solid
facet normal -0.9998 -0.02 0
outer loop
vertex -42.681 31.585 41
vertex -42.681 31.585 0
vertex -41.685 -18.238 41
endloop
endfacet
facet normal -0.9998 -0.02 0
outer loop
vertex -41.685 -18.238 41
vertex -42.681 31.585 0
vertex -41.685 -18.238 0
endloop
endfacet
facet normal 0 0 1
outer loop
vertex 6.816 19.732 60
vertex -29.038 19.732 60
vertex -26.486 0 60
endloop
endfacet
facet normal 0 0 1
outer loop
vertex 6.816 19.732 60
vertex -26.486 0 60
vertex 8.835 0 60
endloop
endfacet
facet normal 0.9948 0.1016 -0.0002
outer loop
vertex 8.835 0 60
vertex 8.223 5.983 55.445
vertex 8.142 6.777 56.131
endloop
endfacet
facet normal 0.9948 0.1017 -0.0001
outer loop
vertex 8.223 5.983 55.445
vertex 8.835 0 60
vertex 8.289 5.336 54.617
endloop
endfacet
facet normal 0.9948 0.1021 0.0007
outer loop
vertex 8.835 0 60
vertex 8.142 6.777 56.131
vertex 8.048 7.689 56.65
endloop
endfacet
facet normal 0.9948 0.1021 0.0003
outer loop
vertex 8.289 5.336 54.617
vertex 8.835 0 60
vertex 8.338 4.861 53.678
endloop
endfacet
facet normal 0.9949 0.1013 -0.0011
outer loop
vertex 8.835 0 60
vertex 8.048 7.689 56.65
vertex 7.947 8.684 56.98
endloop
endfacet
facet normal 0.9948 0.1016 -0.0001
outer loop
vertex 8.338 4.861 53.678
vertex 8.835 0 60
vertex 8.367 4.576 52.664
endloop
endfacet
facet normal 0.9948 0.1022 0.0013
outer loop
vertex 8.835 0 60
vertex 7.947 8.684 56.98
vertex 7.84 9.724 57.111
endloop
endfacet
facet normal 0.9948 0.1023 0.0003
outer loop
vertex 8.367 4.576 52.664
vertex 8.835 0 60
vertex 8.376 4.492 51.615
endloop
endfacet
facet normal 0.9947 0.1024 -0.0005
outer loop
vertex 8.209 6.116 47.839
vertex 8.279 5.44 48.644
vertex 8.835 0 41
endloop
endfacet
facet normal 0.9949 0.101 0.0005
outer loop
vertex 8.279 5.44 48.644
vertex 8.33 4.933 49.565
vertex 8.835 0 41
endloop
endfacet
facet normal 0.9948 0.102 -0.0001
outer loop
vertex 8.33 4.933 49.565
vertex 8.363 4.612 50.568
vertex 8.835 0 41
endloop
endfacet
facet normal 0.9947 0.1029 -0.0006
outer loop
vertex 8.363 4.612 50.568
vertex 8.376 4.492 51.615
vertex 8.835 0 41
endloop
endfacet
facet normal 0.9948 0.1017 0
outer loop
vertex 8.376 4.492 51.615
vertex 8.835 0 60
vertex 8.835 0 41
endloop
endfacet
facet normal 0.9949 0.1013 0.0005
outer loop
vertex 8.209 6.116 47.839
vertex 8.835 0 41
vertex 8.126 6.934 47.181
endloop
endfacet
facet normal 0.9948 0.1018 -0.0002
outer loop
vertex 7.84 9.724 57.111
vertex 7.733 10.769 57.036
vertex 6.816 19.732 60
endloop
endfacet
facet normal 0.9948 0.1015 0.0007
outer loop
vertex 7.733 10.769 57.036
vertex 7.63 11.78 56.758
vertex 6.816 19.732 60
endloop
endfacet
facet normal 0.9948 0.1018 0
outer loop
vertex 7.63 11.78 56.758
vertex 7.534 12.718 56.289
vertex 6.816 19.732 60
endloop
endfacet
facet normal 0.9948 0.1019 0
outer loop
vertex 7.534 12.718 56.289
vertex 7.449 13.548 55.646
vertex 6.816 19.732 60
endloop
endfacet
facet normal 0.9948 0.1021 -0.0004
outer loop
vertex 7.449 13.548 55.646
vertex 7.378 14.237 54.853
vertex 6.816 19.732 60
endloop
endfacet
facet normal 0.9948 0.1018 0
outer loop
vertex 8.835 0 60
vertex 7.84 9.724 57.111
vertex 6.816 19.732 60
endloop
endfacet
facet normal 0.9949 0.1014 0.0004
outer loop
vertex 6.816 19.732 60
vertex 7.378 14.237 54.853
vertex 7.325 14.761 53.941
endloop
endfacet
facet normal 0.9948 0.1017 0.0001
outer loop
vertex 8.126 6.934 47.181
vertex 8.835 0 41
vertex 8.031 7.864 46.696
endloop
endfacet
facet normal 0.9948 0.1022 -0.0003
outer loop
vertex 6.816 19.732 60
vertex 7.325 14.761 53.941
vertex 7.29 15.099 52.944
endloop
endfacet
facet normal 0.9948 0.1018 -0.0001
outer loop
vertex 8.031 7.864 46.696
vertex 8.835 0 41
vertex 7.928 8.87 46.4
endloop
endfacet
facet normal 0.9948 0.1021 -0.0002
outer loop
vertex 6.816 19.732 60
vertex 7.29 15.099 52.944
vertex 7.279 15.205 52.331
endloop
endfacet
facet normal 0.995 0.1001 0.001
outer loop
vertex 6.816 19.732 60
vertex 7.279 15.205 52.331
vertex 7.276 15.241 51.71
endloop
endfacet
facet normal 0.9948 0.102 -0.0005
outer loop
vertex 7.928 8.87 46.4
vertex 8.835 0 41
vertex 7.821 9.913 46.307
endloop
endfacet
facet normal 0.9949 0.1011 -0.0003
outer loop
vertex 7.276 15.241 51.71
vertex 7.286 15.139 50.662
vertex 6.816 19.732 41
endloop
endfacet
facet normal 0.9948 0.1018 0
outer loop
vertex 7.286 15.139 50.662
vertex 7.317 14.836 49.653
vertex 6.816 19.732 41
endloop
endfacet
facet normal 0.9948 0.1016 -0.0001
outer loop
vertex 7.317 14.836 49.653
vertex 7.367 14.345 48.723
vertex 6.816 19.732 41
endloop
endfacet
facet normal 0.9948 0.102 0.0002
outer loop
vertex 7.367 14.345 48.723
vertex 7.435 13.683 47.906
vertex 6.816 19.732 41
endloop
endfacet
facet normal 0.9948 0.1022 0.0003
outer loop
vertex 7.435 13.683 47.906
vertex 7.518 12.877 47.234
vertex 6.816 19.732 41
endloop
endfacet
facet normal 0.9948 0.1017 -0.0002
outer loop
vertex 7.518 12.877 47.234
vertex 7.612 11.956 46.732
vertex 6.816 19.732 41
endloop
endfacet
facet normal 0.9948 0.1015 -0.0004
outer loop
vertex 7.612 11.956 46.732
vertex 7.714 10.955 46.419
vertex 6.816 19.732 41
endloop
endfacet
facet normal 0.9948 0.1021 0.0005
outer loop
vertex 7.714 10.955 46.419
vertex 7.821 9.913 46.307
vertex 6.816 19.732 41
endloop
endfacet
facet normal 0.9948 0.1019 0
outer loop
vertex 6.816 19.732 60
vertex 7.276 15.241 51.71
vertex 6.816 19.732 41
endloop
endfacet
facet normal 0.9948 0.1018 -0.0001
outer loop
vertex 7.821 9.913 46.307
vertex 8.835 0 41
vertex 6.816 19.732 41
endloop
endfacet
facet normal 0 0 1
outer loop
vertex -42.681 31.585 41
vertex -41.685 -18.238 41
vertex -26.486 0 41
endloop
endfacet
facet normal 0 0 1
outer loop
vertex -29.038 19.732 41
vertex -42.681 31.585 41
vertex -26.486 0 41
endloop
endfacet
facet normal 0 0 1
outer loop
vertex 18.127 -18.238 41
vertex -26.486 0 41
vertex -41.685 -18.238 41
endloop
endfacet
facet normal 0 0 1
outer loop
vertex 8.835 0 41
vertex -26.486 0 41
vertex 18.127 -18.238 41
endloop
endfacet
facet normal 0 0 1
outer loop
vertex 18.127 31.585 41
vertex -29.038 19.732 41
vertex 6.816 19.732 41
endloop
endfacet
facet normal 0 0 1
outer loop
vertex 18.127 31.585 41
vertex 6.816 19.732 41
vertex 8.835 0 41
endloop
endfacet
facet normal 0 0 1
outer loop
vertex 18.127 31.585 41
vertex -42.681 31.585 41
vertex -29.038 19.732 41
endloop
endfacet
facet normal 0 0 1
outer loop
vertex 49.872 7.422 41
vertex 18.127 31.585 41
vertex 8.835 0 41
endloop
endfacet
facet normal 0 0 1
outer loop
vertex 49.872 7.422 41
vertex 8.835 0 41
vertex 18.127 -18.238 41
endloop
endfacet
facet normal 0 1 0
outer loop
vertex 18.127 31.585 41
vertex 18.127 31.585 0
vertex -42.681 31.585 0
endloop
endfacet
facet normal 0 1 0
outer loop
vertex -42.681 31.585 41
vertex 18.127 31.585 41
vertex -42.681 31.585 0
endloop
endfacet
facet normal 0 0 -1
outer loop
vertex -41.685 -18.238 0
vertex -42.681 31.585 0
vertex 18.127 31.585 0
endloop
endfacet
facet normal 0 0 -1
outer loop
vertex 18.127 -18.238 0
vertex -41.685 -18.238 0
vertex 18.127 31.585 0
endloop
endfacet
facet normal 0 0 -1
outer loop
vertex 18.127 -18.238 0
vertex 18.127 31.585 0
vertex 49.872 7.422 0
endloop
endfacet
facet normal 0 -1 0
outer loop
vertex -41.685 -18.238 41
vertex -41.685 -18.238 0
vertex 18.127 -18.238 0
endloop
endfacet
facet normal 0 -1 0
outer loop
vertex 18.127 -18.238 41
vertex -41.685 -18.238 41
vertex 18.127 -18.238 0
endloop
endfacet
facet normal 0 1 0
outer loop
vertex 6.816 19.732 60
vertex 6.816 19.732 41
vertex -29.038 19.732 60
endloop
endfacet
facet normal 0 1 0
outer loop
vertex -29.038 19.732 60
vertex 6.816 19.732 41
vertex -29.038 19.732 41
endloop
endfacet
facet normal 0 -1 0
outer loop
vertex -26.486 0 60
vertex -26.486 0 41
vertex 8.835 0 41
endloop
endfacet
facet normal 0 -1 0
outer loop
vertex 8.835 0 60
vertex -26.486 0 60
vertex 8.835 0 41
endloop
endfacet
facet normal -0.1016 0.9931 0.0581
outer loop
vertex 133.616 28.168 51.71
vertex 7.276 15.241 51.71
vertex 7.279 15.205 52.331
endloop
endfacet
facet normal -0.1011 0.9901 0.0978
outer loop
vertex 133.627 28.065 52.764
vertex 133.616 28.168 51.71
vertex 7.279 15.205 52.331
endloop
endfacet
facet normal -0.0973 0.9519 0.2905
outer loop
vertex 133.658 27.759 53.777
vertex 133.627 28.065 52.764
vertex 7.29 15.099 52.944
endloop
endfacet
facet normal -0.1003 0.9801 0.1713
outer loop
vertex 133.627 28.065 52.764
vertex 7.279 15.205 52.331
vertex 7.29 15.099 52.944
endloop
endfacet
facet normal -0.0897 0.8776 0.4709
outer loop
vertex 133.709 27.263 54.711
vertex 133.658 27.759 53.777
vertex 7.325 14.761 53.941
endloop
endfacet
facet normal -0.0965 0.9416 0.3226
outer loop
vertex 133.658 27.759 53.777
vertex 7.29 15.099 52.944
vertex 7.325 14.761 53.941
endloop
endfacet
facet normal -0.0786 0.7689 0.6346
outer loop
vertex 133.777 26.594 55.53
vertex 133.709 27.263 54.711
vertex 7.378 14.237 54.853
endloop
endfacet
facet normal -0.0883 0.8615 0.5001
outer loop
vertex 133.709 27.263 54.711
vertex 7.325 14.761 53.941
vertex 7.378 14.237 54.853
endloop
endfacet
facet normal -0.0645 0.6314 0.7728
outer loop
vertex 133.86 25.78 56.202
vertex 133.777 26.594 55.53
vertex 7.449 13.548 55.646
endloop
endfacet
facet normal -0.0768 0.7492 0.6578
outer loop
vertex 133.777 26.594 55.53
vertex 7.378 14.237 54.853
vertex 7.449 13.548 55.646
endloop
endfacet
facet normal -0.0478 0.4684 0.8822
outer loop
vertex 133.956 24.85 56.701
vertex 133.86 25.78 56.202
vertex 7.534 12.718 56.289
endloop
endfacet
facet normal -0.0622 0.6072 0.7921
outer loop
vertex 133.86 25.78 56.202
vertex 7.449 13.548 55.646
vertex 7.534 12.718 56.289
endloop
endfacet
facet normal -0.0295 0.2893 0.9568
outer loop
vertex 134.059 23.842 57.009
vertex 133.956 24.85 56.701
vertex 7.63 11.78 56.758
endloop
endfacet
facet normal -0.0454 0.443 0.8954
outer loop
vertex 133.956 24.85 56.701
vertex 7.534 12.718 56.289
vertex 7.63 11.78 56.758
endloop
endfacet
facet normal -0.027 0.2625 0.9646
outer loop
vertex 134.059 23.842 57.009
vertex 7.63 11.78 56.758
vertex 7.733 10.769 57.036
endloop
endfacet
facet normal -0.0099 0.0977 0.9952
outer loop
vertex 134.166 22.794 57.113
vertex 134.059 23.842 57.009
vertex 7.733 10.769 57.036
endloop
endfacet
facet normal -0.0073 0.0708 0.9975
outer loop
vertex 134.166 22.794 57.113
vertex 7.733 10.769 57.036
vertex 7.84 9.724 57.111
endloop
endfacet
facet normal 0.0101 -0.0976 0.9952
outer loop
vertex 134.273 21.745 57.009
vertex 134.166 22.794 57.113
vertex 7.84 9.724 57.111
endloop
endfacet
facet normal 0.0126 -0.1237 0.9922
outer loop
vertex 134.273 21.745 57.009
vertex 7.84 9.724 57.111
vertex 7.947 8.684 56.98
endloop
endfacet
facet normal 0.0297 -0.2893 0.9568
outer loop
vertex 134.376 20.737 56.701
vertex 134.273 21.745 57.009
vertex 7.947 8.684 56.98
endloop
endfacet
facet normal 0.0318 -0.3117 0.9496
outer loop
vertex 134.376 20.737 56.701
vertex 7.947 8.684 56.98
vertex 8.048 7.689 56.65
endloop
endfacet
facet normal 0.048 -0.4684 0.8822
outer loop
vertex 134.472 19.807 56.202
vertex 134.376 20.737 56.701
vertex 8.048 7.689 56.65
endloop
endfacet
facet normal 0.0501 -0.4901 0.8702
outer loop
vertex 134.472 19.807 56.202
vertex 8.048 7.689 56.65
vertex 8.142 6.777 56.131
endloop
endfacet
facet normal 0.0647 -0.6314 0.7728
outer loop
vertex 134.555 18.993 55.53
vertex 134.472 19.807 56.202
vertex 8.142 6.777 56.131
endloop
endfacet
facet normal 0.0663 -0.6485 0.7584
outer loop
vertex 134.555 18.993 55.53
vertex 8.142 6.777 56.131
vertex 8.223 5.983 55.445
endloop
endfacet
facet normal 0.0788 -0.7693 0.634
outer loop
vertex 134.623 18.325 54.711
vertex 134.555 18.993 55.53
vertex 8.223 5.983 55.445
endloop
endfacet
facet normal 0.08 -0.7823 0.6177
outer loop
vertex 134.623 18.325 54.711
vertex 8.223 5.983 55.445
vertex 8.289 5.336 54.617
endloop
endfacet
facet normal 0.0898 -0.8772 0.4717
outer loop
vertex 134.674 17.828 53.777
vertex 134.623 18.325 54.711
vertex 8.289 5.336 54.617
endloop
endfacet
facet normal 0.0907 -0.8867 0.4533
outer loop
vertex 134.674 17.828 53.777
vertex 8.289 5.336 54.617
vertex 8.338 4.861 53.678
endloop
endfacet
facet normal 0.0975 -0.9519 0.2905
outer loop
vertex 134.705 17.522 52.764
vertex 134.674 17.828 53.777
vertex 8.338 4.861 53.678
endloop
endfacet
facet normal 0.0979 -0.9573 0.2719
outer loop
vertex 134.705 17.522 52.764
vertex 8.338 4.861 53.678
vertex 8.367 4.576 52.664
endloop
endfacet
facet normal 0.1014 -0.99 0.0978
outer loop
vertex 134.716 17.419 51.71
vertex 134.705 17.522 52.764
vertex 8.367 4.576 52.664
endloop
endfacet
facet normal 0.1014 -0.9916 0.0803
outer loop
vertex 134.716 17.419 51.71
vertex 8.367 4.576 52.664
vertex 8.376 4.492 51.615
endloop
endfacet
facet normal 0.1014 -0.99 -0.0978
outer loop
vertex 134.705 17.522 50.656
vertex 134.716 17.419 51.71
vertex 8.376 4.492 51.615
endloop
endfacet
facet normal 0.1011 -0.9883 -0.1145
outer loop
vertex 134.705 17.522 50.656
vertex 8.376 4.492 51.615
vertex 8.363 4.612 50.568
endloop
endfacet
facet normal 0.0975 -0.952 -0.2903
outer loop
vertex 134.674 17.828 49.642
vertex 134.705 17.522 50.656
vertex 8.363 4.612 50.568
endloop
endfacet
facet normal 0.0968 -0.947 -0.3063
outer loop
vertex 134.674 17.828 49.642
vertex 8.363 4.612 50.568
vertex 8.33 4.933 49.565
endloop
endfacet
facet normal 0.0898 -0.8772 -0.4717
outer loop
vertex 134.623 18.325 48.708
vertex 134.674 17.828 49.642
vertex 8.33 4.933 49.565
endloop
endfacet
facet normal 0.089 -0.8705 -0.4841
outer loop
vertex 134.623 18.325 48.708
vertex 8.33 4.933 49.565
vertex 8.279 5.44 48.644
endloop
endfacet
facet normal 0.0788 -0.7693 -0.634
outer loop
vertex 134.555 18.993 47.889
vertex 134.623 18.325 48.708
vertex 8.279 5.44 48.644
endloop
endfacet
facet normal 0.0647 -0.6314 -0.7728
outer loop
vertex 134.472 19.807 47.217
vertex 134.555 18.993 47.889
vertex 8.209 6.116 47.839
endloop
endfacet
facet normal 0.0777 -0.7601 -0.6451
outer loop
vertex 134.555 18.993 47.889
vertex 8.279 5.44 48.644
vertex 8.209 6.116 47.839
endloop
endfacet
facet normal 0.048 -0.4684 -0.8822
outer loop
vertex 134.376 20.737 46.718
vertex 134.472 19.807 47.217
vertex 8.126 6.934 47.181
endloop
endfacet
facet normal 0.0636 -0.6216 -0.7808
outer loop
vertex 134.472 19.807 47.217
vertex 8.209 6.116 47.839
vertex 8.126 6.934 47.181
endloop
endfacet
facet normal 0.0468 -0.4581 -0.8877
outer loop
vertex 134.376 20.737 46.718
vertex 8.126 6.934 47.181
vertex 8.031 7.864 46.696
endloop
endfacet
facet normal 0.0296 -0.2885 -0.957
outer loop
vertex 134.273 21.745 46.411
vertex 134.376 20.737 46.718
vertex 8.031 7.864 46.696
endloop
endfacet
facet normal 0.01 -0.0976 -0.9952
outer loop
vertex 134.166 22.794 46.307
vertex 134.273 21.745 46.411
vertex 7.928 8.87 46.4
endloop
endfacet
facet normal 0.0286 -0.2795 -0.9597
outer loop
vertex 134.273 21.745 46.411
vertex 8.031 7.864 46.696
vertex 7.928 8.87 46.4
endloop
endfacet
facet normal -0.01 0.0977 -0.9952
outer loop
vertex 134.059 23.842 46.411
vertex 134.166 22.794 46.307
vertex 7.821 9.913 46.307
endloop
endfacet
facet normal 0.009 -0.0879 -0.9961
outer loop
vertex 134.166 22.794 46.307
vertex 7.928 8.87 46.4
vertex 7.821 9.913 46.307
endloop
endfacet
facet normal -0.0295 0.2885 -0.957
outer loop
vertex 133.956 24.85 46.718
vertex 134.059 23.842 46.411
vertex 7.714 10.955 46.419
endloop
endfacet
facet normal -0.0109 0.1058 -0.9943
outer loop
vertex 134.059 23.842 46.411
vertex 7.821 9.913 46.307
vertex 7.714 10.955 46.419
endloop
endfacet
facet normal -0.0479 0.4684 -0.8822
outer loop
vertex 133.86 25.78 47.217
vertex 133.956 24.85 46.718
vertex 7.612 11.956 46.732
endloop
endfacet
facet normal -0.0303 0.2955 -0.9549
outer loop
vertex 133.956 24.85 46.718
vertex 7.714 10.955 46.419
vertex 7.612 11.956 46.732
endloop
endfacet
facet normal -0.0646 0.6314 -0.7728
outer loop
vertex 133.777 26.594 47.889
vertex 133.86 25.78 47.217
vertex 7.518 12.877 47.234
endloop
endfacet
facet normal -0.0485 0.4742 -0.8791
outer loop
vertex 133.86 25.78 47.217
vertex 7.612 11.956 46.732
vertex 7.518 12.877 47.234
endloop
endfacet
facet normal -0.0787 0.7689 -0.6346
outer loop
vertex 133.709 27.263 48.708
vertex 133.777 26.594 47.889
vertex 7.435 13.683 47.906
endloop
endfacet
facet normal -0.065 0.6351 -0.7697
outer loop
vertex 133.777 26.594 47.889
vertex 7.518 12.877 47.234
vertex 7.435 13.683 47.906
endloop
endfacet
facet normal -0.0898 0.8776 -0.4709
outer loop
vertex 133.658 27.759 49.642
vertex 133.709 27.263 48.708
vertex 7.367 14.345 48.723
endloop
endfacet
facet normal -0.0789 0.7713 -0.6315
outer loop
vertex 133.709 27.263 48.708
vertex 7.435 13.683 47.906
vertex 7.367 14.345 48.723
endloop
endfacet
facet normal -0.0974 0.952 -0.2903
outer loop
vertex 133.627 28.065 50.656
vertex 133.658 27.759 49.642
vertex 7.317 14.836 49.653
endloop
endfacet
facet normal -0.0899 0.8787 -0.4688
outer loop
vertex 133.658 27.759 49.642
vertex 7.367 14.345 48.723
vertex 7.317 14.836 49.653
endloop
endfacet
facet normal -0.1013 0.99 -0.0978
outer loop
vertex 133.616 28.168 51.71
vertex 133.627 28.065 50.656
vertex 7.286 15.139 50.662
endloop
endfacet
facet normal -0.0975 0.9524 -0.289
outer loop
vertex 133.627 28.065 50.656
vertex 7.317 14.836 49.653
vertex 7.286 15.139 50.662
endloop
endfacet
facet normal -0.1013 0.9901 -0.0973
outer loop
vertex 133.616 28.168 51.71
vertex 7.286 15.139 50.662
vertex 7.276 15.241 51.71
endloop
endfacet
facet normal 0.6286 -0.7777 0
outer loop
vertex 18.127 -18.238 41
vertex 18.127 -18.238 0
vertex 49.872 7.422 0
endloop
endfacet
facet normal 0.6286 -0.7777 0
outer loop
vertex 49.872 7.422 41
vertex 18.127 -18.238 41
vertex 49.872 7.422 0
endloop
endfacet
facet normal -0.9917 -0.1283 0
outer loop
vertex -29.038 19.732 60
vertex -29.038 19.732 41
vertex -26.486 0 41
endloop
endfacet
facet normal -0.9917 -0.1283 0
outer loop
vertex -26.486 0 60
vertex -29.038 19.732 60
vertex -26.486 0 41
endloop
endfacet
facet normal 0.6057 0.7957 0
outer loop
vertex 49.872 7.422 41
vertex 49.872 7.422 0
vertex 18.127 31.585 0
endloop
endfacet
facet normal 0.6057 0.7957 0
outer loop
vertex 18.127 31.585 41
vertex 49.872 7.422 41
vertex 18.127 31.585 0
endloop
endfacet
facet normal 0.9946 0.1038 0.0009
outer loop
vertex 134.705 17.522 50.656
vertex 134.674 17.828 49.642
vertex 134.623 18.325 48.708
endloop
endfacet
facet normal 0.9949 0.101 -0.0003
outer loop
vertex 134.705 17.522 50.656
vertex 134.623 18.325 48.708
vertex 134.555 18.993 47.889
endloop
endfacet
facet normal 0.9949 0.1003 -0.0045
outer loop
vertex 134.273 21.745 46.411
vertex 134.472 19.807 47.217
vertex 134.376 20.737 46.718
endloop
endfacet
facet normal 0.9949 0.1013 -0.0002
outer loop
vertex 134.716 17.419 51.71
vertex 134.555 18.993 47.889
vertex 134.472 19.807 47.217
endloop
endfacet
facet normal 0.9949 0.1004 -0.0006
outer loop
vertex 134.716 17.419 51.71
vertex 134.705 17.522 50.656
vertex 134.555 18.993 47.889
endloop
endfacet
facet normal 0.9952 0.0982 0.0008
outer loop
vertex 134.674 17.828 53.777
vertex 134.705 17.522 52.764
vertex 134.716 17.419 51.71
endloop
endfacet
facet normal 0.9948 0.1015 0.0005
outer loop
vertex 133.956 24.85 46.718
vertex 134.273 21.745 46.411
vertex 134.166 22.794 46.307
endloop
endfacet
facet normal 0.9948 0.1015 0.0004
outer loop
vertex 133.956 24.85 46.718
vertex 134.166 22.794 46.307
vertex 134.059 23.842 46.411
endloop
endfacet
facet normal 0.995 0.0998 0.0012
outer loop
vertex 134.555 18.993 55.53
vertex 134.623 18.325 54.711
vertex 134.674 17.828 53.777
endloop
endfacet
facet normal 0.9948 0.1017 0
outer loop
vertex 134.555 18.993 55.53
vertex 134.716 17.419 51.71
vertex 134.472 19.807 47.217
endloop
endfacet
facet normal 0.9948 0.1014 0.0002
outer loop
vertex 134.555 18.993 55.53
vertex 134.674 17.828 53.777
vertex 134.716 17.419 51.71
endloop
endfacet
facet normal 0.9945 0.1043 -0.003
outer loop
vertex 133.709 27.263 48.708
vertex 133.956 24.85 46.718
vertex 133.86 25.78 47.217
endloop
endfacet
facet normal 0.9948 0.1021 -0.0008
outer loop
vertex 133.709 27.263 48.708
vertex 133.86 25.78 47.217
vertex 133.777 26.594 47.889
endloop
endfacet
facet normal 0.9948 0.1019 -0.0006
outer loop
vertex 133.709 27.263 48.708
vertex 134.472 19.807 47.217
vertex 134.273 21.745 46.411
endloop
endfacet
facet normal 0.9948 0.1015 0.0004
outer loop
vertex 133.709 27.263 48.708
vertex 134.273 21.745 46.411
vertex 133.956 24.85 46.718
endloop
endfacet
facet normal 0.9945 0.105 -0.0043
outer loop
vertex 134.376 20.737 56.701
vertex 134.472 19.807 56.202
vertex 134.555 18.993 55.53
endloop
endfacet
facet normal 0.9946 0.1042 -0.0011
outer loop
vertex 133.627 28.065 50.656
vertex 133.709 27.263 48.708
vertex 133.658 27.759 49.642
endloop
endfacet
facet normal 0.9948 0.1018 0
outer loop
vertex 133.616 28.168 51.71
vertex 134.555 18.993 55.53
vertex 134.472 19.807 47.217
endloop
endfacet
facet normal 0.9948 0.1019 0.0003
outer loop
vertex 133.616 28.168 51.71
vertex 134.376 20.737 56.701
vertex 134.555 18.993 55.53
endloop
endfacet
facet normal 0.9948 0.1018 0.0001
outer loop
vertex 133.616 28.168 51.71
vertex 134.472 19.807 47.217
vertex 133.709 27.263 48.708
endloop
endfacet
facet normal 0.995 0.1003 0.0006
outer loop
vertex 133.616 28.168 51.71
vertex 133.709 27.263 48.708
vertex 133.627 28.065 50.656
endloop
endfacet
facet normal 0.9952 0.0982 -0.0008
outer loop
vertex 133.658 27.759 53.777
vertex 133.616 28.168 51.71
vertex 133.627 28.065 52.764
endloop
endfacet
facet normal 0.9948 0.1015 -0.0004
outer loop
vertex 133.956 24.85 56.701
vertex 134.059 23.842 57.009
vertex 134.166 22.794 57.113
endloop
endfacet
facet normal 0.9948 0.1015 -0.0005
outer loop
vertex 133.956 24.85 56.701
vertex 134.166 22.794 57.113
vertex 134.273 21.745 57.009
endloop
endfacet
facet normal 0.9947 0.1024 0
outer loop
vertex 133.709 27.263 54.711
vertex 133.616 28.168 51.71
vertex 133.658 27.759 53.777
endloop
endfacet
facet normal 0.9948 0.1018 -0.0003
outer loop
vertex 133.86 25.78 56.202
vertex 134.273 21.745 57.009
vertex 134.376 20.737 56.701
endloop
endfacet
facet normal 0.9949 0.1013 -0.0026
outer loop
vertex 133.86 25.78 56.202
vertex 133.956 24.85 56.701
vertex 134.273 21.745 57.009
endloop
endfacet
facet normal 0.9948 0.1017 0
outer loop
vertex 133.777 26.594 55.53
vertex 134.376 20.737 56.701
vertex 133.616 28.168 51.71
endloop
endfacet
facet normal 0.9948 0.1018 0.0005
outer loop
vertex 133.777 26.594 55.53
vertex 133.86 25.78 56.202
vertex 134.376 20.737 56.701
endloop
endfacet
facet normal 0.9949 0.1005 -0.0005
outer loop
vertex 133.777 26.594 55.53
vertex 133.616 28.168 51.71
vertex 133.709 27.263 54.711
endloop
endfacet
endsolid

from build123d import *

# Parameters (mm, degrees)
F1_DEPTH = 41
F3_DEPTH = 19
F4_R     = 5.402873
F5_DEPTH = 127


with BuildPart() as f1:
    # F0 (on Top) → F1 (new body)
    with BuildSketch(Plane.XY):
        Polygon((-42.681199, 31.584967), (-41.684866, -18.23815), (18.126922, -18.23815), (49.872324, 7.42222), (18.126922, 31.584967), align=None)
    extrude(amount=F1_DEPTH)

    # F2 (on face) → F3 (join)
    with BuildSketch(Plane.XY.offset(41)):
        Polygon((6.816162, 19.731937), (-29.038044, 19.731937), (-26.485959, 0), (8.835195, 0), align=None)
    extrude(amount=F3_DEPTH)

    # F4 (on face) → F5 (join)
    with BuildSketch(Plane(origin=(8.743648, 0.894677, 0), x_dir=(-0.101792, 0.994806, 0), z_dir=(0.994806, 0.101792, 0))):
        with Locations((9.018134, 51.709723)):
            Circle(F4_R)
    extrude(amount=F5_DEPTH)


solid = f1.part
